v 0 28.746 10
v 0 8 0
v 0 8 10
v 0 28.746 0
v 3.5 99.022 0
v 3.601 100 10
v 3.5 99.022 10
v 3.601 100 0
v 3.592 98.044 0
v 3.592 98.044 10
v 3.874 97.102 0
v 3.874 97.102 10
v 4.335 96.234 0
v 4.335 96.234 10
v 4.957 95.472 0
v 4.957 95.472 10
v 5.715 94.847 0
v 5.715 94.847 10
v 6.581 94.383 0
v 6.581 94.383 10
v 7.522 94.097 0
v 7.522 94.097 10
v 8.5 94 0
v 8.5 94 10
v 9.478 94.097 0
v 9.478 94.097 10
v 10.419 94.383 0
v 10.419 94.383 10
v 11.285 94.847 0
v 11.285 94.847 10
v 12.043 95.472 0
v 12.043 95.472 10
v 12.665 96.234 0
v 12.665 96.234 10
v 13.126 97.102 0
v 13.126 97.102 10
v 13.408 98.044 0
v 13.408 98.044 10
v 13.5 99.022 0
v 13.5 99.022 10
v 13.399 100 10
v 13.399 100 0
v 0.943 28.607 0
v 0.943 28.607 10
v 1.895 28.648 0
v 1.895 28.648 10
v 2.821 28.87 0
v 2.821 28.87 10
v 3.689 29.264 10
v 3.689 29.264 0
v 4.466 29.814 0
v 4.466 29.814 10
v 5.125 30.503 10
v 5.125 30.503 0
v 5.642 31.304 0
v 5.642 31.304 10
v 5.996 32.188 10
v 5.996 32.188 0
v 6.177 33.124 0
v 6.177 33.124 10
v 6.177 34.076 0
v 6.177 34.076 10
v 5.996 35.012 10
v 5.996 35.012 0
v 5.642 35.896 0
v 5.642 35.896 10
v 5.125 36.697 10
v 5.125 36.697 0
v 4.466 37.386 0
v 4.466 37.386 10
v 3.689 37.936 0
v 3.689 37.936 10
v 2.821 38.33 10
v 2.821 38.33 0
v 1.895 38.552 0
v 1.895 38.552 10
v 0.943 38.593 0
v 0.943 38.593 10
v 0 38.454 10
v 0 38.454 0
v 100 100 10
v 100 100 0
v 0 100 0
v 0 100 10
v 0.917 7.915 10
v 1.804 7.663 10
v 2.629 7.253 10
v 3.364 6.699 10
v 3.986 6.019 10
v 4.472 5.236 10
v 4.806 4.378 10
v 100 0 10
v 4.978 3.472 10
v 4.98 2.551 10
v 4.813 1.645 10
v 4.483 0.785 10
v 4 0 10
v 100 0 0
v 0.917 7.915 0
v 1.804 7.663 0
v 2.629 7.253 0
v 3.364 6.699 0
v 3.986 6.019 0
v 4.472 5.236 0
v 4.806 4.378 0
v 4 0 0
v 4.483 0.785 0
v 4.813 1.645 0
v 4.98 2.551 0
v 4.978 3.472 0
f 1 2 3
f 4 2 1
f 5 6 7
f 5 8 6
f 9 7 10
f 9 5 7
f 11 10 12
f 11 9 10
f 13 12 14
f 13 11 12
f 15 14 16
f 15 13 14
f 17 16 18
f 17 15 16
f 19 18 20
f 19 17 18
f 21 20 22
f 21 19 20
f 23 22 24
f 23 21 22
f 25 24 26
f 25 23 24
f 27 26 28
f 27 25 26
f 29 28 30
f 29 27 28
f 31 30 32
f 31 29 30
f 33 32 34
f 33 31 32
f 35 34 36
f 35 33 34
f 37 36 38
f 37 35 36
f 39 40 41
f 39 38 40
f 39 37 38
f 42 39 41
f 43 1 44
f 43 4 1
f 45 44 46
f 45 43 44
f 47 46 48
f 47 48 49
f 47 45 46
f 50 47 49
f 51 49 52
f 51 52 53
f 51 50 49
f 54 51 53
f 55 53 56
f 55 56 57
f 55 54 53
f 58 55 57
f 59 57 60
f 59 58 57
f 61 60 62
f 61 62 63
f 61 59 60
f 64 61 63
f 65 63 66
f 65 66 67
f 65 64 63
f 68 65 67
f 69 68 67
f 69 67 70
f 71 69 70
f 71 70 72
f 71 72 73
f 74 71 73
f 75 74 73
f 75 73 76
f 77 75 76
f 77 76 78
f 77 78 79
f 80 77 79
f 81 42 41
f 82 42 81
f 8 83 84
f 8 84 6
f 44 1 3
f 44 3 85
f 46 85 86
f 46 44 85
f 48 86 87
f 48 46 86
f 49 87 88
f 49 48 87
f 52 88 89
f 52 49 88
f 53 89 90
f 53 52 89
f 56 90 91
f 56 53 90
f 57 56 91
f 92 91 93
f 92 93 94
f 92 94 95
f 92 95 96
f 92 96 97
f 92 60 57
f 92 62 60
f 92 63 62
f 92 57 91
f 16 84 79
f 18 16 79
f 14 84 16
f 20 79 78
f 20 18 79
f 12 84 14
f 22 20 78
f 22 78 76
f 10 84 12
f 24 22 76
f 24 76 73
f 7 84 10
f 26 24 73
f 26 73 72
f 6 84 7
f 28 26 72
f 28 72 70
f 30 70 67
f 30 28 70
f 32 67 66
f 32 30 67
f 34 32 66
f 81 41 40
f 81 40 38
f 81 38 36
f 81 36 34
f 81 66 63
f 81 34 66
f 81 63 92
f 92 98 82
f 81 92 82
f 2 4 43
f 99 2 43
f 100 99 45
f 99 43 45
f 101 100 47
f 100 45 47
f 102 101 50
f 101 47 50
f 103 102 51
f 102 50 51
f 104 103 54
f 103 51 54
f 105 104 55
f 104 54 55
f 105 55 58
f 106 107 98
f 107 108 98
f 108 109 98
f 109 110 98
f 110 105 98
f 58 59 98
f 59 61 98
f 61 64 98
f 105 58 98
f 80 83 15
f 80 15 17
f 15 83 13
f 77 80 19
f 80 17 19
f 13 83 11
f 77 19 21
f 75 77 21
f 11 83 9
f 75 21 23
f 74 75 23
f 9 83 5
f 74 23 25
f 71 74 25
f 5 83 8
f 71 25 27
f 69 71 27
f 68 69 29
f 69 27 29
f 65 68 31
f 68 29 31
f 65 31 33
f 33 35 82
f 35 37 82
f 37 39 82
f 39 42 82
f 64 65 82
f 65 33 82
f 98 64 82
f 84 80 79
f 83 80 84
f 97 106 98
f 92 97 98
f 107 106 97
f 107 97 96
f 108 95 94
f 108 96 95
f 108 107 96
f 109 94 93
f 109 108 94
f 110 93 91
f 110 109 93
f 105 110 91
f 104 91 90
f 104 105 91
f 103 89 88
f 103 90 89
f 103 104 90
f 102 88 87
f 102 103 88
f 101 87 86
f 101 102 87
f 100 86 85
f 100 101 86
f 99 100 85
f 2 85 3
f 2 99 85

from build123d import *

# Parameters (mm, degrees)
SKETCH_1_W          = 100
SKETCH_1_H          = 100
EXTRUDE_1_DEPTH     = 10
SKETCH_2_R          = 5
CUT_EXTRUDE_1_DEPTH = 10
SKETCH_3_R          = 5
CUT_EXTRUDE_2_DEPTH = 10
SKETCH_4_R          = 5
CUT_EXTRUDE_3_DEPTH = 10


with BuildPart() as part:
    # Эскиз1 → Бобышка-Вытянуть1 (new body)
    with BuildSketch(Plane.XY):
        with Locations((50, 50)):
            Rectangle(SKETCH_1_W, SKETCH_1_H)
    extrude(amount=EXTRUDE_1_DEPTH)

    # Эскиз2 → Вырез-Вытянуть1 (cut)
    with BuildSketch(Plane.XY):
        with Locations((0, 3)):
            Circle(SKETCH_2_R)
    extrude(amount=CUT_EXTRUDE_1_DEPTH, mode=Mode.SUBTRACT)

    # Эскиз3 → Вырез-Вытянуть2 (cut)
    with BuildSketch(Plane.XY):
        with Locations((1.2, 33.6)):
            Circle(SKETCH_3_R)
    extrude(amount=CUT_EXTRUDE_2_DEPTH, mode=Mode.SUBTRACT)

    # Эскиз4 → Вырез-Вытянуть3 (cut)
    with BuildSketch(Plane.XY):
        with Locations((8.5, 99)):
            Circle(SKETCH_4_R)
    extrude(amount=CUT_EXTRUDE_3_DEPTH, mode=Mode.SUBTRACT)


solid = part.part
